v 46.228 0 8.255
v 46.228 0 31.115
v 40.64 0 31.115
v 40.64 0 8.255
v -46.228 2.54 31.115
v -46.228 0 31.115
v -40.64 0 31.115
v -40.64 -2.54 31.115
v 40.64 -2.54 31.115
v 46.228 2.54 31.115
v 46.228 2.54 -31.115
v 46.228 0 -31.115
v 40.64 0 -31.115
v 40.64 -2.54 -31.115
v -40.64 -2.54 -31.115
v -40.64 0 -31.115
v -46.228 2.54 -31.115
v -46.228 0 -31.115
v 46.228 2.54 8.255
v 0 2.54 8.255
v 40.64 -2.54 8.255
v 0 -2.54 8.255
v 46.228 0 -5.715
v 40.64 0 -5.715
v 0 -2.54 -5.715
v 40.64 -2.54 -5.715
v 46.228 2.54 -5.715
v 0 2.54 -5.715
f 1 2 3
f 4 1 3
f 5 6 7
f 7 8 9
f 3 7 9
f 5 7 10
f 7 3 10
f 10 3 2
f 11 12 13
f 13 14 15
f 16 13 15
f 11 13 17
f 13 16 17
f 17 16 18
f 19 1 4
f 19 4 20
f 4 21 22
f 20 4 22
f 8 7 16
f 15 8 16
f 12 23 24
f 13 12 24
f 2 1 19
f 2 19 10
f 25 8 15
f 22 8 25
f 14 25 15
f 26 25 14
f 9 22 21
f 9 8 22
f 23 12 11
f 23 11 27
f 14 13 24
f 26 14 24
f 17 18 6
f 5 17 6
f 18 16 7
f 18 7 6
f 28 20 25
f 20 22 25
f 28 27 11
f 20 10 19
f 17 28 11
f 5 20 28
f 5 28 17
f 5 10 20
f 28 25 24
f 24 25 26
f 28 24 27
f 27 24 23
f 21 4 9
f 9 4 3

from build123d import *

# Parameters (mm, degrees)
F1_DEPTH = 2.54
F2_W     = 5.588
F2_H     = 22.86
F2_H_2   = 25.4
F2_H_3   = 62.23
F3_DEPTH = 2.54


with BuildPart() as f1:
    # F0 (on Front) → F1 (new body)
    with BuildSketch(Plane.XZ):
        Polygon((40.64, 8.255), (40.64, 31.115), (-40.64, 31.115), (-40.64, -31.115), (40.64, -31.115), (40.64, -5.715), (0, -5.715), (0, 8.255), align=None)
    extrude(amount=F1_DEPTH)

    # F2 (on face) → F3 (join)
    with BuildSketch(Plane(origin=(0, 0, 0), x_dir=(-1, 0, 0), z_dir=(0, 1, 0))):
        with Locations((-43.434, 19.685)):
            Rectangle(F2_W, F2_H)
        Polygon((40.64, 31.115), (-40.64, 31.115), (-40.64, 8.255), (0, 8.255), (0, -5.715), (-40.64, -5.715), (-40.64, -31.115), (40.64, -31.115), align=None)
        with Locations((-43.434, -18.415)):
            Rectangle(F2_W, F2_H_2)
        with Locations((43.434, 0)):
            Rectangle(F2_W, F2_H_3)
    extrude(amount=F3_DEPTH)


solid = f1.part
